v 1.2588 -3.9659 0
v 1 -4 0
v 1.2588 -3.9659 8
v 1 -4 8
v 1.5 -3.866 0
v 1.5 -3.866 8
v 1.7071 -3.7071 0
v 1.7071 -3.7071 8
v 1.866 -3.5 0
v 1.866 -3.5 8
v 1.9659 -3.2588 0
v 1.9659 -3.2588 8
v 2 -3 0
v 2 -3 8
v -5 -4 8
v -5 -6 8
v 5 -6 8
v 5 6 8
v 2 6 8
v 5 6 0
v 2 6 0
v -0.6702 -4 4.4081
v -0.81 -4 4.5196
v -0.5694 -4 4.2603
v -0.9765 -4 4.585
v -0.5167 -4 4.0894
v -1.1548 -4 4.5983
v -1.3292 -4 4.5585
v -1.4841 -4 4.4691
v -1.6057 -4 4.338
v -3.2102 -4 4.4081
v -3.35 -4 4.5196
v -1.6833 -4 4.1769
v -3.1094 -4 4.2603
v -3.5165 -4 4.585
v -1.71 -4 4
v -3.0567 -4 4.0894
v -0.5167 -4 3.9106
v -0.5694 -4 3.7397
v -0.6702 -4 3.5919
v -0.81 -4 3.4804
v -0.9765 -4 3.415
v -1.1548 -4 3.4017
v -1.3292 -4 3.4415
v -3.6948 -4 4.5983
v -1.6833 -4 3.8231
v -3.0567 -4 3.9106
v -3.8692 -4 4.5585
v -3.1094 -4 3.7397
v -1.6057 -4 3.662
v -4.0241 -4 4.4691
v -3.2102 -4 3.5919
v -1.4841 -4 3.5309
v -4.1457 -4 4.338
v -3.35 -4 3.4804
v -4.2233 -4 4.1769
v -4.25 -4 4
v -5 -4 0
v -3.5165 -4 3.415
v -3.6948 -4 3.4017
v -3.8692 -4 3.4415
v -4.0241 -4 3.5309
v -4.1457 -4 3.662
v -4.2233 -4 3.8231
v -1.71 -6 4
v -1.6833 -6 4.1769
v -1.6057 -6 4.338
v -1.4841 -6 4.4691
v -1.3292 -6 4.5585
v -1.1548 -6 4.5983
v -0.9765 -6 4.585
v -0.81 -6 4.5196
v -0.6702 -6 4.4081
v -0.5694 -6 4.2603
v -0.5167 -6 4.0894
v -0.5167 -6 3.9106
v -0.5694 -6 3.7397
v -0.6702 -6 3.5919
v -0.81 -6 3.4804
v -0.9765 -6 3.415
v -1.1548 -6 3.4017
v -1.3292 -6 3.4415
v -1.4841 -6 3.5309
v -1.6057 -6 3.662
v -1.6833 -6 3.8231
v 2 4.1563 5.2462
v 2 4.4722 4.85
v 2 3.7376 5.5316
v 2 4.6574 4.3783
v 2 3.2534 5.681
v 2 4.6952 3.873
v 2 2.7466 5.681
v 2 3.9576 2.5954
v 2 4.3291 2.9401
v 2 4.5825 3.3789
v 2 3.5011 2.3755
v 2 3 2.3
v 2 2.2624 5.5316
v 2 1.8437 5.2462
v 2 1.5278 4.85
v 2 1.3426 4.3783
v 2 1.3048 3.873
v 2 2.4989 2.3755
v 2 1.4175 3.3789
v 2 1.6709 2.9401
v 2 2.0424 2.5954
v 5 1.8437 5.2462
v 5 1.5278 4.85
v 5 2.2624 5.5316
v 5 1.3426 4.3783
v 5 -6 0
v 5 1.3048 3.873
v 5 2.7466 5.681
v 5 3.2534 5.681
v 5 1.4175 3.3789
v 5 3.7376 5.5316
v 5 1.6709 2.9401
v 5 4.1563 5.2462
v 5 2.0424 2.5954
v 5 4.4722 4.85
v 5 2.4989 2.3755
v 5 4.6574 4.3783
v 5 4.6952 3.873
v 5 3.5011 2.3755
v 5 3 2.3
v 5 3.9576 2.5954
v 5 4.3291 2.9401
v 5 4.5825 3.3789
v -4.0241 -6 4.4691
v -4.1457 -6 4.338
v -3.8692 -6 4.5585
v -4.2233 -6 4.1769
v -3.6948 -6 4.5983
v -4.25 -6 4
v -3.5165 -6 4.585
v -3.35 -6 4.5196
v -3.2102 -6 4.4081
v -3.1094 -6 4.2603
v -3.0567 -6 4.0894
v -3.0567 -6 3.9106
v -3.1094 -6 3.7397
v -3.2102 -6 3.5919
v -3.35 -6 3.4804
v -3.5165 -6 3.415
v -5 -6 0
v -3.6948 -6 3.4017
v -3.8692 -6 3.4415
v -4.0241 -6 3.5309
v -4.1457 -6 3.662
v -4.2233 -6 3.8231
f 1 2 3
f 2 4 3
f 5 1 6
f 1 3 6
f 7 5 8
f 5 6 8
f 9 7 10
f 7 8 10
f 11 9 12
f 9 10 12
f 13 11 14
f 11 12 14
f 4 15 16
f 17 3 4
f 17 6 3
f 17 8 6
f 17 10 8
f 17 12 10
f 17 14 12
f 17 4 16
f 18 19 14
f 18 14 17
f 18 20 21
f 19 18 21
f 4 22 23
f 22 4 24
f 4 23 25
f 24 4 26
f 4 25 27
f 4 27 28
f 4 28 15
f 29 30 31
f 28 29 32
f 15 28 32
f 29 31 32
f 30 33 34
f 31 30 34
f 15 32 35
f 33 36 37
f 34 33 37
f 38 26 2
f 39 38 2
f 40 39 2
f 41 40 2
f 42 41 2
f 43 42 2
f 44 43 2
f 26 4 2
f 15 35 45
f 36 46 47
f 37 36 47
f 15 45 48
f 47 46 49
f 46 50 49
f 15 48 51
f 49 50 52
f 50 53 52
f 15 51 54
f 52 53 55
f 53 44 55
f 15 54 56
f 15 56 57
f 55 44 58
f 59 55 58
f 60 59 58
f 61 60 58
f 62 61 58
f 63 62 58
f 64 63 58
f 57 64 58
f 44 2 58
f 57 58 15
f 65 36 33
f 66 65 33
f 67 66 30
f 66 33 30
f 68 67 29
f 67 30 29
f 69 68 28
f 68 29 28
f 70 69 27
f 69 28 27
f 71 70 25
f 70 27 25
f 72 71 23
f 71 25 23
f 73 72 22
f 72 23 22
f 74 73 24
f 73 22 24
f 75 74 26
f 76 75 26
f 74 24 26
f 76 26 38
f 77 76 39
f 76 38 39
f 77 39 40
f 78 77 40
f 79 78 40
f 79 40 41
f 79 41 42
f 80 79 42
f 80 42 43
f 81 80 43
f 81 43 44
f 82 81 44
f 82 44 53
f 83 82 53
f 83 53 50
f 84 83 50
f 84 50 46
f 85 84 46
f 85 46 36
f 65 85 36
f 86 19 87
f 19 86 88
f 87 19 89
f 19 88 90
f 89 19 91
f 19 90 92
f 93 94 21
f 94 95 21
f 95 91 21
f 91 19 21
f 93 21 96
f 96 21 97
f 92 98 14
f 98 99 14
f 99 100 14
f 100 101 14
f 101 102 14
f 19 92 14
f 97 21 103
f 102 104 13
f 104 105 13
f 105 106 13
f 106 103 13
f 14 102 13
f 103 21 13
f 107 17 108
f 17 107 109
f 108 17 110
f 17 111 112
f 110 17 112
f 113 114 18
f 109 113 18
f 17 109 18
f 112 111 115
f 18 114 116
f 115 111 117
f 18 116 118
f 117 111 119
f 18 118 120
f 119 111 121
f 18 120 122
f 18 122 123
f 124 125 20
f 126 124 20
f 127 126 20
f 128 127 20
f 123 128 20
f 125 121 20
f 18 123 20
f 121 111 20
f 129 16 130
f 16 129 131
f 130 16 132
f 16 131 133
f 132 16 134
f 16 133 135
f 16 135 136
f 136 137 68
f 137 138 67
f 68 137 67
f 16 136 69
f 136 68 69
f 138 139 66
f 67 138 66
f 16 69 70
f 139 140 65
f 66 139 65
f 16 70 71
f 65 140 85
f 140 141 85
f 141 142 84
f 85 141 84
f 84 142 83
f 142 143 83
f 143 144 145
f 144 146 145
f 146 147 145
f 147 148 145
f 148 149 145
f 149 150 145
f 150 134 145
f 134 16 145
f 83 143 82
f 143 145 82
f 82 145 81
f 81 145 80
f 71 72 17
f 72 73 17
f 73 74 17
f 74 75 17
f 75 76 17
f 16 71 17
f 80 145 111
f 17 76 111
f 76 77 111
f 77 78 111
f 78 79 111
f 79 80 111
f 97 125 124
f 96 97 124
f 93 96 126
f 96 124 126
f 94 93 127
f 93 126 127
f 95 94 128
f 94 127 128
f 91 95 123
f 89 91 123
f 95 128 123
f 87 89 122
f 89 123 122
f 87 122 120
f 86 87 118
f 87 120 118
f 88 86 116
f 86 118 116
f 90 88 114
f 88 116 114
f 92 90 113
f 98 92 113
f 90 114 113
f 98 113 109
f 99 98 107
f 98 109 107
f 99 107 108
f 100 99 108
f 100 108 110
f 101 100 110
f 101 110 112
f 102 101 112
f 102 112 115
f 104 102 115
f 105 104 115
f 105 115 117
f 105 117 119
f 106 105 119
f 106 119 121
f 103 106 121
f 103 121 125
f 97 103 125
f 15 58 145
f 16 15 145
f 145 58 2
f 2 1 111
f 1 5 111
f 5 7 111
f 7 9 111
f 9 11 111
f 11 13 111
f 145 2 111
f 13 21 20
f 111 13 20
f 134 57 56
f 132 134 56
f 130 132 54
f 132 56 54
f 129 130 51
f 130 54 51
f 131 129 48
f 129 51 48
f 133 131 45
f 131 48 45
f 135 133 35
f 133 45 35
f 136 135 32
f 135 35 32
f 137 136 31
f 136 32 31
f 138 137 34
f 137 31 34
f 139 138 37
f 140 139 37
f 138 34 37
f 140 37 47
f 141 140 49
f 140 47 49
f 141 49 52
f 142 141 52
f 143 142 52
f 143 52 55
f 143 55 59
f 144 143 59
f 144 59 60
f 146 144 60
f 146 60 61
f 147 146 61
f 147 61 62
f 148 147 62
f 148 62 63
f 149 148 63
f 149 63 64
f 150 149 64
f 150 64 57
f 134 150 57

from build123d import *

# Parameters (mm, degrees)
EXTRUDE_1_DEPTH     = 8
SKETCH_2_R          = 0.6
CUT_EXTRUDE_1_DEPTH = 14.747727085
HOLE_WIZARD_M3_1_D  = 3.4
FILLET_1_R          = 1


with BuildPart() as part:
    # ｽｹｯﾁ1 → ﾎﾞｽ - 押し出し1 (new body)
    with BuildSketch(Plane.XY):
        Polygon((-5, -6), (5, -6), (5, 6), (2, 6), (2, -4), (-5, -4), align=None)
    extrude(amount=EXTRUDE_1_DEPTH)

    # ｽｹｯﾁ2 → ｶｯﾄ - 押し出し1 (cut, through all)
    with BuildSketch(Plane(origin=(0, -4, 0), x_dir=(1, 0, 0), z_dir=(0, 1, 0))):
        with Locations(Location((-1.11, -4, 0), (0, 0, 180))):
            Circle(SKETCH_2_R)
        with Locations(Location((-3.65, -4, 0), (0, 0, 180))):
            Circle(SKETCH_2_R)
    extrude(amount=-CUT_EXTRUDE_1_DEPTH, mode=Mode.SUBTRACT)

    # M3 すきま穴1 (through all)
    with Locations(Plane.ZY.offset(-2)):
        with Locations((4, 3)):
            Hole(HOLE_WIZARD_M3_1_D / 2)

    # ﾌｨﾚｯﾄ1
    fillet_1_edges = [part.edges().sort_by_distance(p)[0] for p in [
        (2, -4, 4),
    ]]
    fillet(fillet_1_edges, radius=FILLET_1_R)


solid = part.part
